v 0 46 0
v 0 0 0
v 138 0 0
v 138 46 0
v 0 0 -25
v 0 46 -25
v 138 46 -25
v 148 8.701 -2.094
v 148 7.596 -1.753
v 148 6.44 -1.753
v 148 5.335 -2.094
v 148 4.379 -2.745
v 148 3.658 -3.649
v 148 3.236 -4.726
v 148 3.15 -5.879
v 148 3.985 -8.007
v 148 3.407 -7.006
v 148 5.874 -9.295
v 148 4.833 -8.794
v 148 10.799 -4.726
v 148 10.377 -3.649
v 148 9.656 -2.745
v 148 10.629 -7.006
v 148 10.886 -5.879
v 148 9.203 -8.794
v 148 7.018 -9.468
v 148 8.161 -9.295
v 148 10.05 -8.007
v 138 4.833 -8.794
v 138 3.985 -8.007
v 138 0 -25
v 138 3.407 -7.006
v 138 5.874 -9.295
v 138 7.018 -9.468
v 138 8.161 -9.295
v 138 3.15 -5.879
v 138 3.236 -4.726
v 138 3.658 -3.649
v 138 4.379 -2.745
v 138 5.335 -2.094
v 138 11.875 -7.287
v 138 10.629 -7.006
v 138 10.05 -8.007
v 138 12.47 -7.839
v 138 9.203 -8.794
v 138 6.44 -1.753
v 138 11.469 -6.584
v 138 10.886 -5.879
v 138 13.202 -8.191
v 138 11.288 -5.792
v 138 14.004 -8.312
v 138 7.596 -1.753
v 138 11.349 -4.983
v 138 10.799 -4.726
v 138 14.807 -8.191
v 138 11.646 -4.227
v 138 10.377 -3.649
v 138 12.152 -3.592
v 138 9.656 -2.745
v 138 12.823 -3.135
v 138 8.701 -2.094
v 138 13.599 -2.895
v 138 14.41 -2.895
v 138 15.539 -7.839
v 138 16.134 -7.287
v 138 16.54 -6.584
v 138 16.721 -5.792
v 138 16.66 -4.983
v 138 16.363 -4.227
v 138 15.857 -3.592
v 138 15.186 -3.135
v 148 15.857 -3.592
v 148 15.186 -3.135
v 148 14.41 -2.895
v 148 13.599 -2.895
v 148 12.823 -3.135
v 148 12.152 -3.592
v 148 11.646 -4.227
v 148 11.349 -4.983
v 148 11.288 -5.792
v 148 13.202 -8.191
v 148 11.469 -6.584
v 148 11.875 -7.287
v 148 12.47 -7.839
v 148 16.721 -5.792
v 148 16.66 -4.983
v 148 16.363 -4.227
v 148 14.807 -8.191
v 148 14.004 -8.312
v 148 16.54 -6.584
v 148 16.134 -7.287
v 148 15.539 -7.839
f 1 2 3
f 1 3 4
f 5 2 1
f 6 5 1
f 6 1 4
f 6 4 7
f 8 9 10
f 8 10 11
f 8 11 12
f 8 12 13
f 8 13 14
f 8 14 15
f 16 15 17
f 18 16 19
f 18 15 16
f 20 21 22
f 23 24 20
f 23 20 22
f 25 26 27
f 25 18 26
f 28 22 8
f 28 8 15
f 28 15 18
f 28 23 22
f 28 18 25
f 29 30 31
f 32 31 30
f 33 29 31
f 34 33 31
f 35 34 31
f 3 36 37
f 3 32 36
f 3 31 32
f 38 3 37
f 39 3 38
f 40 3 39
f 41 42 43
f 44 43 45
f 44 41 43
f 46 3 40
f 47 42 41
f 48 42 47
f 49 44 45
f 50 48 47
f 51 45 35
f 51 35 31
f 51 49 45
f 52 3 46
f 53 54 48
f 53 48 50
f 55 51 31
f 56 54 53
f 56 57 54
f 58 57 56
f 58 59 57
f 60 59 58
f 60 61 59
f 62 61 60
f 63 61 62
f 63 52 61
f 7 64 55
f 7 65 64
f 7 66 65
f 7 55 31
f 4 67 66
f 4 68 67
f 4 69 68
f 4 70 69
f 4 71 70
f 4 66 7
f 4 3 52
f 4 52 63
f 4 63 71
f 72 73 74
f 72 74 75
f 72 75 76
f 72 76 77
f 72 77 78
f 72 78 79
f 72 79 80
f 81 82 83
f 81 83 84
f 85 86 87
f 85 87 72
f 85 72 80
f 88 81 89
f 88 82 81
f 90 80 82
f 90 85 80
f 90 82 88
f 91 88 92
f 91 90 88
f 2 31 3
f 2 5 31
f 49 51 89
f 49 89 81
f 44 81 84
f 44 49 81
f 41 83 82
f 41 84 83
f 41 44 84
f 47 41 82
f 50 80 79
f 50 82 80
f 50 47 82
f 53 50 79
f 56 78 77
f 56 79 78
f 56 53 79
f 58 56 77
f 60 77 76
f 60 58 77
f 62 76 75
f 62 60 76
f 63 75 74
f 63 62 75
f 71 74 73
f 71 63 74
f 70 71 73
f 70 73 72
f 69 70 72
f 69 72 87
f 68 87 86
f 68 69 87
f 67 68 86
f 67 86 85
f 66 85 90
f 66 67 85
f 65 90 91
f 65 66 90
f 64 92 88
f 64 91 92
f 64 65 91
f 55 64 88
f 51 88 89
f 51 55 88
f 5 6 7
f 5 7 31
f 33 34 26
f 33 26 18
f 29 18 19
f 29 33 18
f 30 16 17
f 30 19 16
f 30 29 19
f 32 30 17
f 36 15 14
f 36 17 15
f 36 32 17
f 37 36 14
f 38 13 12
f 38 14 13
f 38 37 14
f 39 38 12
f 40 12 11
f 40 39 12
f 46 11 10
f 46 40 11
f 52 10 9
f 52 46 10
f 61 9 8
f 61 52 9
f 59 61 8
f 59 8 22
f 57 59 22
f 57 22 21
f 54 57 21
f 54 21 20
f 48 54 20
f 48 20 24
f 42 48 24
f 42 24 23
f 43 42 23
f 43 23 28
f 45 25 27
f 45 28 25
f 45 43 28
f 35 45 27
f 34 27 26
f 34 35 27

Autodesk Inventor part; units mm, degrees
ref_plane "YZ Plane" through (0, 0, 0) normal (1, 0, 0) x (0, 1, 0)
ref_plane "XZ Plane" through (0, 0, 0) normal (0, 1, 0) x (-1, 0, 0)
ref_plane "XY Plane" through (0, 0, 0) normal (0, 0, 1) x (1, 0, 0)
sketch "Sketch1" plane through (0, 0, 0) normal (1, 0, 0) x (0, 1, 0)
  line L0 (0, 0) -> (46, 0)
  line L1 (46, 0) -> (46, -25)
  line L2 (46, -25) -> (0, -25)
  line L3 (0, -25) -> (0, 0)
  dimension "d0" = 46
  dimension "d1" = 25
extrude "Extrusion1" add sketch "Sketch1" along normal blind 138
sketch "Sketch2" plane through (138, 0, 0) normal (1, 0, 0) x (0, 0, -1)
  circle A0 centre (5.5887, 7.0177) radius 3.879
  circle A1 centre (5.5887, 14.0045) radius 2.7237
  point P0 (0, 0)
extrude "Extrusion2" add sketch "Sketch2" along normal blind 10
properties part number "battery1"
